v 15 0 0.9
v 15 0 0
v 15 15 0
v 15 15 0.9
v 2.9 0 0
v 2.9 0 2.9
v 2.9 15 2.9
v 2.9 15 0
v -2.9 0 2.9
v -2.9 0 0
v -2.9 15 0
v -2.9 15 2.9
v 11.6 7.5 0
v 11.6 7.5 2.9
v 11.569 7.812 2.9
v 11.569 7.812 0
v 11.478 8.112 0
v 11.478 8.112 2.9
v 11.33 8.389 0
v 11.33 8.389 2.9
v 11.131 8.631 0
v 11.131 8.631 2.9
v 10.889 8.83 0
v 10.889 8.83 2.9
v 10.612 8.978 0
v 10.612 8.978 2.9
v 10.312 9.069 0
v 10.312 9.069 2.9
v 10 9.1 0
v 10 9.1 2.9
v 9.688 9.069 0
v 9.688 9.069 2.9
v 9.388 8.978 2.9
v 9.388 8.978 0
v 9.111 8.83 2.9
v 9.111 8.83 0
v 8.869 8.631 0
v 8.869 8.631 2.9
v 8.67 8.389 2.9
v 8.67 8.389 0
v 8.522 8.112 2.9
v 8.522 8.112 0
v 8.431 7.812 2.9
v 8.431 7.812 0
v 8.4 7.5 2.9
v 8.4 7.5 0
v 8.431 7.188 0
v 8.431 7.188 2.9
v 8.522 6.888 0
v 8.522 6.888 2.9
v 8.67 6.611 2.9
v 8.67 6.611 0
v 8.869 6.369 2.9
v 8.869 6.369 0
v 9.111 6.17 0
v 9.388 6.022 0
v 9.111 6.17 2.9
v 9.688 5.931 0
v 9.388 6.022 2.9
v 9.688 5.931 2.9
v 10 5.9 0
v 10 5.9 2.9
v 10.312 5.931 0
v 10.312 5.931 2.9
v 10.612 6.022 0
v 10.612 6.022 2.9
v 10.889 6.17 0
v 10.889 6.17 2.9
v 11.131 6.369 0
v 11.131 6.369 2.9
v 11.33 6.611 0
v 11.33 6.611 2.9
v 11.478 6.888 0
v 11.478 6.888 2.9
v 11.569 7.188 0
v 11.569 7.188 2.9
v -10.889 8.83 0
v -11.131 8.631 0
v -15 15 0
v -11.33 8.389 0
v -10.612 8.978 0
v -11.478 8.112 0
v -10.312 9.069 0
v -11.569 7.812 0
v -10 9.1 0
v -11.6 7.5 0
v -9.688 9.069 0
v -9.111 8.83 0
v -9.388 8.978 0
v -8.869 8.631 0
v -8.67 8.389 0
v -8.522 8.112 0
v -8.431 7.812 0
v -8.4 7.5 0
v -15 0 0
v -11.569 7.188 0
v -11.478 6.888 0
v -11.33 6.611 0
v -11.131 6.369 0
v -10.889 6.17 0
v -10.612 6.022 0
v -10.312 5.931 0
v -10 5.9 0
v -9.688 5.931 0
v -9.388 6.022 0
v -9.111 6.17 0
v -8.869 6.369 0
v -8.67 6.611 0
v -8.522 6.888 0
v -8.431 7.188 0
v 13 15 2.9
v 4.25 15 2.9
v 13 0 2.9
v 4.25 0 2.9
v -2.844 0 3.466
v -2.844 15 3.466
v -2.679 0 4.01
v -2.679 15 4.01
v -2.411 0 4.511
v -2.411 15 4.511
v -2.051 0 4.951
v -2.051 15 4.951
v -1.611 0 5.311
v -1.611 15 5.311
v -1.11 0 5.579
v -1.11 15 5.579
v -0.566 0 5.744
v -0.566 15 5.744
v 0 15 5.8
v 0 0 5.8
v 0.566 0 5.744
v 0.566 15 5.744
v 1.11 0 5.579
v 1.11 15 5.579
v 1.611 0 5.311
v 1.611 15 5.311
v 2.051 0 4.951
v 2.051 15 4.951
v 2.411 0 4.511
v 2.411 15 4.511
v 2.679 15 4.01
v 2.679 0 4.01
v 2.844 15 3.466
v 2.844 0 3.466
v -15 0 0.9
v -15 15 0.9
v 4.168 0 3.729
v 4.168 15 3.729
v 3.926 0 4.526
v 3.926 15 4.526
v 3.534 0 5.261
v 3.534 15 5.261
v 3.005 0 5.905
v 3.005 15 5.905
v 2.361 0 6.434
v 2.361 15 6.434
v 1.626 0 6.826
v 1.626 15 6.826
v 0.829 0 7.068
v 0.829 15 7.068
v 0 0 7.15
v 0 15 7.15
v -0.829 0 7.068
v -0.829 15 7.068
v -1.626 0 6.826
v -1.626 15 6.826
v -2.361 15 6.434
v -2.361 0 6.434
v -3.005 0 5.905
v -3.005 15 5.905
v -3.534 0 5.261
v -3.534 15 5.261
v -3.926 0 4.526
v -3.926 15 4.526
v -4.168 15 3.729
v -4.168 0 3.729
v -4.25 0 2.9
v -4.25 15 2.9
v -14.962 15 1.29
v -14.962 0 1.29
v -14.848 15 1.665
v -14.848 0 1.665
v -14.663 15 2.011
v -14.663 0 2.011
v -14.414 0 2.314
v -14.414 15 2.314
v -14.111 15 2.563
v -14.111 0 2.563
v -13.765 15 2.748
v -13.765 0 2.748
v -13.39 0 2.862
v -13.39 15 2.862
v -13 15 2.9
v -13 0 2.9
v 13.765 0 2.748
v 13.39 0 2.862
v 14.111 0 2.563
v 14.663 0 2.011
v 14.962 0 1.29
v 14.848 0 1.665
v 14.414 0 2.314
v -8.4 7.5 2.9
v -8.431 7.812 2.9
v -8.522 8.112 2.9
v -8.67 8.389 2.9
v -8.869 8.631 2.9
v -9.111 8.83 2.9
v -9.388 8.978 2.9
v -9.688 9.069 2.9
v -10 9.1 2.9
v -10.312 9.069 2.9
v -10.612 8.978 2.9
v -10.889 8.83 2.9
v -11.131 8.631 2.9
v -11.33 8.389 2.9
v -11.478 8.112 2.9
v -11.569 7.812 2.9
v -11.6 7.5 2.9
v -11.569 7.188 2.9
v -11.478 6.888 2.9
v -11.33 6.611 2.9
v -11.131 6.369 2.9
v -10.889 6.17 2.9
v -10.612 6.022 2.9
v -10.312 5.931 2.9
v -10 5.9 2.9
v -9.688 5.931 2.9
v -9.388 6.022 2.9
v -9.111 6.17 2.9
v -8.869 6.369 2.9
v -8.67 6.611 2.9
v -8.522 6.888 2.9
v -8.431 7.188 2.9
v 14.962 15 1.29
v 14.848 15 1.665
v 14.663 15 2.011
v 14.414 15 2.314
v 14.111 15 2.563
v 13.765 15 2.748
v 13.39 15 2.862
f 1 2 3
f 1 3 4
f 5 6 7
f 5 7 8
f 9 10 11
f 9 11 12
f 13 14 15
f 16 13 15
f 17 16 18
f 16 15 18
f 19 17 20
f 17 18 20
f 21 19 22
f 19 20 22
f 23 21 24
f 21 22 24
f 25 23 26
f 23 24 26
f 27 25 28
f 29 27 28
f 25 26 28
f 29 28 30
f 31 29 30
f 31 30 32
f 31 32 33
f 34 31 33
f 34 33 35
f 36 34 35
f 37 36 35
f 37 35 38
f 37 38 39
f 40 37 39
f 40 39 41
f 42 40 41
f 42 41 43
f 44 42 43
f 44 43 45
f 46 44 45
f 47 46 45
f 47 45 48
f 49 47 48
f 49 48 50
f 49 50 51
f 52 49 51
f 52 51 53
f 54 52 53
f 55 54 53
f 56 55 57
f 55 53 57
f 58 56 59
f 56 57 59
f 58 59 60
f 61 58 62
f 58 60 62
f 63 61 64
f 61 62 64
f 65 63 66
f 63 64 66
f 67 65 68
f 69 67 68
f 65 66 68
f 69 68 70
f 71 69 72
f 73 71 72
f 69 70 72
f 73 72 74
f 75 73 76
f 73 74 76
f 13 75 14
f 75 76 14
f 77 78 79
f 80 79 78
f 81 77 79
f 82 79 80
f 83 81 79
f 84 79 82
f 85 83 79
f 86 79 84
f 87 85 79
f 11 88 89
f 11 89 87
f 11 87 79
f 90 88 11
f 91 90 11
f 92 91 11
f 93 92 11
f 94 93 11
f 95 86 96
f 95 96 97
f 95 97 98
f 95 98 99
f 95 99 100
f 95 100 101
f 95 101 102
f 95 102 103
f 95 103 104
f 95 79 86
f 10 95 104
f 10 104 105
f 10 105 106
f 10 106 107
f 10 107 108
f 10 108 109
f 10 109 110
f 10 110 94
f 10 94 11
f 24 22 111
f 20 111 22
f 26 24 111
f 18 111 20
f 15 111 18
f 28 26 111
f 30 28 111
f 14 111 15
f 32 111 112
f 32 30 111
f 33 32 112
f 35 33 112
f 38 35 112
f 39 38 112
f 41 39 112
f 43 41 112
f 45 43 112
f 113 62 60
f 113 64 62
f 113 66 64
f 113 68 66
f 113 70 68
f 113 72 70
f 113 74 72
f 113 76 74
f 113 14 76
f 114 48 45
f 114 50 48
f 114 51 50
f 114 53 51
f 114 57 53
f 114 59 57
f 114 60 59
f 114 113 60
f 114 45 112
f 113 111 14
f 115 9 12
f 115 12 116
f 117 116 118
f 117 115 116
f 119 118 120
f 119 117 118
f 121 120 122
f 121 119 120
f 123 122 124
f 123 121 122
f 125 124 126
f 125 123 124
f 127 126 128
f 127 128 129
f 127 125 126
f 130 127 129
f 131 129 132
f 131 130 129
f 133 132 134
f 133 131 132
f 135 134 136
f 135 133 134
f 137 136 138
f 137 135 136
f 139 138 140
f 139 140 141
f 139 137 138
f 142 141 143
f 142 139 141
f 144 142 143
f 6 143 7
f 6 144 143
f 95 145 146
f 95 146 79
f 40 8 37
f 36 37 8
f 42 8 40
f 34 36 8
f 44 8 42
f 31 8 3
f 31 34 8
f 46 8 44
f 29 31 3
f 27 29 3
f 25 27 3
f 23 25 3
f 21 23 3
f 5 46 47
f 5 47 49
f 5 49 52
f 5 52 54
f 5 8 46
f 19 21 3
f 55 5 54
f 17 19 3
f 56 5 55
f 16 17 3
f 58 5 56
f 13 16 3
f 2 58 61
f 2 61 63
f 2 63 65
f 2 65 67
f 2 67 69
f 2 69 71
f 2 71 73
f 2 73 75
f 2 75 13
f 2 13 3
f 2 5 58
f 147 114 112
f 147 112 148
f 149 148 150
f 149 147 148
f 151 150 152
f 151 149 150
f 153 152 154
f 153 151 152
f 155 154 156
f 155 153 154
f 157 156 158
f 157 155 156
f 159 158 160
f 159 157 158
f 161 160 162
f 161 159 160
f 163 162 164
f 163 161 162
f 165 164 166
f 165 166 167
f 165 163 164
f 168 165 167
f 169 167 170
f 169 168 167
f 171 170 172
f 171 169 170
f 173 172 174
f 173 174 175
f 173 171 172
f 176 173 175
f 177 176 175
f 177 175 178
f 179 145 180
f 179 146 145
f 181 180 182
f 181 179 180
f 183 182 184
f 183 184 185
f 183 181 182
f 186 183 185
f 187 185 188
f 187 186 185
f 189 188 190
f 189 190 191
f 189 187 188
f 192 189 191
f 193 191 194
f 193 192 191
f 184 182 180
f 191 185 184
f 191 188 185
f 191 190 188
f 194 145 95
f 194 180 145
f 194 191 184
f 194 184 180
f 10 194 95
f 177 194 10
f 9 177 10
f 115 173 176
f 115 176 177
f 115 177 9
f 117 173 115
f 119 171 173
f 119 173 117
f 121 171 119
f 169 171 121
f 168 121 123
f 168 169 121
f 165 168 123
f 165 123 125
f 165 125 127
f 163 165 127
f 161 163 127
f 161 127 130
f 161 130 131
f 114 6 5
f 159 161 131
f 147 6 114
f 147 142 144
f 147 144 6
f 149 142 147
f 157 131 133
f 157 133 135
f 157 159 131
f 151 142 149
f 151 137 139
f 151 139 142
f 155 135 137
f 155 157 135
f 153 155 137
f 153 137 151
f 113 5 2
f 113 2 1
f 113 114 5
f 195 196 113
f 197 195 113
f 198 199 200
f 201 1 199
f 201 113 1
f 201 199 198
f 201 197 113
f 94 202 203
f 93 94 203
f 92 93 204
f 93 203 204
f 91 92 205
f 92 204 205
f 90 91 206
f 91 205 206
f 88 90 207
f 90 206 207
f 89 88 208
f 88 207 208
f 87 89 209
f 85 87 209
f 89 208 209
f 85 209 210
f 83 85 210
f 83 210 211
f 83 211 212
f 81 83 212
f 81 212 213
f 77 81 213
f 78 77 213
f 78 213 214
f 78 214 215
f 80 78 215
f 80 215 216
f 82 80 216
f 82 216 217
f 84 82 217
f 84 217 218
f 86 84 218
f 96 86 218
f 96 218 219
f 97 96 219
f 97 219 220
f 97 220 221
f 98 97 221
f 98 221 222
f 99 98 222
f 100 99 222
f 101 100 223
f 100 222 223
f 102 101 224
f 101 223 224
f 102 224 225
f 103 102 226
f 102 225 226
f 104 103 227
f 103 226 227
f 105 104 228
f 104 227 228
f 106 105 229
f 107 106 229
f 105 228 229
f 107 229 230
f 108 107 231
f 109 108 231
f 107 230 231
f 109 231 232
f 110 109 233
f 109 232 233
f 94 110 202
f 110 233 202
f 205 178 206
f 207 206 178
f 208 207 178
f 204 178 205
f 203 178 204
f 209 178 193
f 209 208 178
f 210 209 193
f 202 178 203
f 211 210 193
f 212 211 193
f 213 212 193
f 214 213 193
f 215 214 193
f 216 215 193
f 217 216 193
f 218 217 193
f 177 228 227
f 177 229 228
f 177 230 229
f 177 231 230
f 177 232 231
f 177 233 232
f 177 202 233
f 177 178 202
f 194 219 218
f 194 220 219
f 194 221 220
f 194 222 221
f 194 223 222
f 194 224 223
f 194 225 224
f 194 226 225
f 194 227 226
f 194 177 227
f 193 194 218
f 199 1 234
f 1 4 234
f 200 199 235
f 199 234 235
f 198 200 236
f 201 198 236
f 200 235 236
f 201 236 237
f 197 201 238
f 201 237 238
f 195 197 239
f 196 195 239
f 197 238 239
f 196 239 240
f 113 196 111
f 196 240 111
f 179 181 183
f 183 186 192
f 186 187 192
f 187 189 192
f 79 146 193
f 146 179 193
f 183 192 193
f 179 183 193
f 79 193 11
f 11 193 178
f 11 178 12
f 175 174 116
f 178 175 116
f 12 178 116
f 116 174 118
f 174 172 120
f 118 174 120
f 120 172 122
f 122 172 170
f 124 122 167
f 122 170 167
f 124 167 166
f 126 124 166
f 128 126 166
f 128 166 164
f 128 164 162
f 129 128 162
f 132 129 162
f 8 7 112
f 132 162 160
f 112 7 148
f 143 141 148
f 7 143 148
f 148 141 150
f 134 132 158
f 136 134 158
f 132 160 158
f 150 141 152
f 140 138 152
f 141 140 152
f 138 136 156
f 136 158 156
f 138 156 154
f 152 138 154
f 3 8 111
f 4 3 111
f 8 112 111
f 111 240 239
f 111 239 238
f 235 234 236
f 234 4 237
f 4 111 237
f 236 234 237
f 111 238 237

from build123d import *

# Parameters (mm, degrees)
F1_DEPTH = 15
F2_R     = 1.6
F3_DEPTH = 2.901
F4_R     = 2


with BuildPart() as f1:
    # F0 (on Front) → F1 (new body)
    with BuildSketch(Plane.XZ):
        with BuildLine():
            Line((-15, 2.9), (-15, 0))
            Line((-15, 0), (-2.9, 0))
            Line((-2.9, 0), (-2.9, 2.9))
            ThreePointArc((-2.9, 2.9), (0, 5.8), (2.9, 2.9))
            Line((2.9, 2.9), (2.9, 0))
            Line((2.9, 0), (15, 0))
            Line((15, 0), (15, 2.9))
            Line((15, 2.9), (4.25, 2.9))
            ThreePointArc((4.25, 2.9), (0, 7.15), (-4.25, 2.9))
            Line((-4.25, 2.9), (-15, 2.9))
        make_face()
    extrude(amount=-F1_DEPTH)

    # F2 (on face) → F3 (cut, through all)
    with BuildSketch(Plane.XY.offset(2.9)):
        with Locations((-10, 7.5)):
            Circle(F2_R)
        with Locations((10, 7.5)):
            Circle(F2_R)
    extrude(amount=-F3_DEPTH, mode=Mode.SUBTRACT)

    # F4
    f4_edges = [f1.edges().sort_by_distance(p)[0] for p in [
        (-15, 7.5, 2.9),
        (15, 7.5, 2.9),
    ]]
    fillet(f4_edges, radius=F4_R)


solid = f1.part
